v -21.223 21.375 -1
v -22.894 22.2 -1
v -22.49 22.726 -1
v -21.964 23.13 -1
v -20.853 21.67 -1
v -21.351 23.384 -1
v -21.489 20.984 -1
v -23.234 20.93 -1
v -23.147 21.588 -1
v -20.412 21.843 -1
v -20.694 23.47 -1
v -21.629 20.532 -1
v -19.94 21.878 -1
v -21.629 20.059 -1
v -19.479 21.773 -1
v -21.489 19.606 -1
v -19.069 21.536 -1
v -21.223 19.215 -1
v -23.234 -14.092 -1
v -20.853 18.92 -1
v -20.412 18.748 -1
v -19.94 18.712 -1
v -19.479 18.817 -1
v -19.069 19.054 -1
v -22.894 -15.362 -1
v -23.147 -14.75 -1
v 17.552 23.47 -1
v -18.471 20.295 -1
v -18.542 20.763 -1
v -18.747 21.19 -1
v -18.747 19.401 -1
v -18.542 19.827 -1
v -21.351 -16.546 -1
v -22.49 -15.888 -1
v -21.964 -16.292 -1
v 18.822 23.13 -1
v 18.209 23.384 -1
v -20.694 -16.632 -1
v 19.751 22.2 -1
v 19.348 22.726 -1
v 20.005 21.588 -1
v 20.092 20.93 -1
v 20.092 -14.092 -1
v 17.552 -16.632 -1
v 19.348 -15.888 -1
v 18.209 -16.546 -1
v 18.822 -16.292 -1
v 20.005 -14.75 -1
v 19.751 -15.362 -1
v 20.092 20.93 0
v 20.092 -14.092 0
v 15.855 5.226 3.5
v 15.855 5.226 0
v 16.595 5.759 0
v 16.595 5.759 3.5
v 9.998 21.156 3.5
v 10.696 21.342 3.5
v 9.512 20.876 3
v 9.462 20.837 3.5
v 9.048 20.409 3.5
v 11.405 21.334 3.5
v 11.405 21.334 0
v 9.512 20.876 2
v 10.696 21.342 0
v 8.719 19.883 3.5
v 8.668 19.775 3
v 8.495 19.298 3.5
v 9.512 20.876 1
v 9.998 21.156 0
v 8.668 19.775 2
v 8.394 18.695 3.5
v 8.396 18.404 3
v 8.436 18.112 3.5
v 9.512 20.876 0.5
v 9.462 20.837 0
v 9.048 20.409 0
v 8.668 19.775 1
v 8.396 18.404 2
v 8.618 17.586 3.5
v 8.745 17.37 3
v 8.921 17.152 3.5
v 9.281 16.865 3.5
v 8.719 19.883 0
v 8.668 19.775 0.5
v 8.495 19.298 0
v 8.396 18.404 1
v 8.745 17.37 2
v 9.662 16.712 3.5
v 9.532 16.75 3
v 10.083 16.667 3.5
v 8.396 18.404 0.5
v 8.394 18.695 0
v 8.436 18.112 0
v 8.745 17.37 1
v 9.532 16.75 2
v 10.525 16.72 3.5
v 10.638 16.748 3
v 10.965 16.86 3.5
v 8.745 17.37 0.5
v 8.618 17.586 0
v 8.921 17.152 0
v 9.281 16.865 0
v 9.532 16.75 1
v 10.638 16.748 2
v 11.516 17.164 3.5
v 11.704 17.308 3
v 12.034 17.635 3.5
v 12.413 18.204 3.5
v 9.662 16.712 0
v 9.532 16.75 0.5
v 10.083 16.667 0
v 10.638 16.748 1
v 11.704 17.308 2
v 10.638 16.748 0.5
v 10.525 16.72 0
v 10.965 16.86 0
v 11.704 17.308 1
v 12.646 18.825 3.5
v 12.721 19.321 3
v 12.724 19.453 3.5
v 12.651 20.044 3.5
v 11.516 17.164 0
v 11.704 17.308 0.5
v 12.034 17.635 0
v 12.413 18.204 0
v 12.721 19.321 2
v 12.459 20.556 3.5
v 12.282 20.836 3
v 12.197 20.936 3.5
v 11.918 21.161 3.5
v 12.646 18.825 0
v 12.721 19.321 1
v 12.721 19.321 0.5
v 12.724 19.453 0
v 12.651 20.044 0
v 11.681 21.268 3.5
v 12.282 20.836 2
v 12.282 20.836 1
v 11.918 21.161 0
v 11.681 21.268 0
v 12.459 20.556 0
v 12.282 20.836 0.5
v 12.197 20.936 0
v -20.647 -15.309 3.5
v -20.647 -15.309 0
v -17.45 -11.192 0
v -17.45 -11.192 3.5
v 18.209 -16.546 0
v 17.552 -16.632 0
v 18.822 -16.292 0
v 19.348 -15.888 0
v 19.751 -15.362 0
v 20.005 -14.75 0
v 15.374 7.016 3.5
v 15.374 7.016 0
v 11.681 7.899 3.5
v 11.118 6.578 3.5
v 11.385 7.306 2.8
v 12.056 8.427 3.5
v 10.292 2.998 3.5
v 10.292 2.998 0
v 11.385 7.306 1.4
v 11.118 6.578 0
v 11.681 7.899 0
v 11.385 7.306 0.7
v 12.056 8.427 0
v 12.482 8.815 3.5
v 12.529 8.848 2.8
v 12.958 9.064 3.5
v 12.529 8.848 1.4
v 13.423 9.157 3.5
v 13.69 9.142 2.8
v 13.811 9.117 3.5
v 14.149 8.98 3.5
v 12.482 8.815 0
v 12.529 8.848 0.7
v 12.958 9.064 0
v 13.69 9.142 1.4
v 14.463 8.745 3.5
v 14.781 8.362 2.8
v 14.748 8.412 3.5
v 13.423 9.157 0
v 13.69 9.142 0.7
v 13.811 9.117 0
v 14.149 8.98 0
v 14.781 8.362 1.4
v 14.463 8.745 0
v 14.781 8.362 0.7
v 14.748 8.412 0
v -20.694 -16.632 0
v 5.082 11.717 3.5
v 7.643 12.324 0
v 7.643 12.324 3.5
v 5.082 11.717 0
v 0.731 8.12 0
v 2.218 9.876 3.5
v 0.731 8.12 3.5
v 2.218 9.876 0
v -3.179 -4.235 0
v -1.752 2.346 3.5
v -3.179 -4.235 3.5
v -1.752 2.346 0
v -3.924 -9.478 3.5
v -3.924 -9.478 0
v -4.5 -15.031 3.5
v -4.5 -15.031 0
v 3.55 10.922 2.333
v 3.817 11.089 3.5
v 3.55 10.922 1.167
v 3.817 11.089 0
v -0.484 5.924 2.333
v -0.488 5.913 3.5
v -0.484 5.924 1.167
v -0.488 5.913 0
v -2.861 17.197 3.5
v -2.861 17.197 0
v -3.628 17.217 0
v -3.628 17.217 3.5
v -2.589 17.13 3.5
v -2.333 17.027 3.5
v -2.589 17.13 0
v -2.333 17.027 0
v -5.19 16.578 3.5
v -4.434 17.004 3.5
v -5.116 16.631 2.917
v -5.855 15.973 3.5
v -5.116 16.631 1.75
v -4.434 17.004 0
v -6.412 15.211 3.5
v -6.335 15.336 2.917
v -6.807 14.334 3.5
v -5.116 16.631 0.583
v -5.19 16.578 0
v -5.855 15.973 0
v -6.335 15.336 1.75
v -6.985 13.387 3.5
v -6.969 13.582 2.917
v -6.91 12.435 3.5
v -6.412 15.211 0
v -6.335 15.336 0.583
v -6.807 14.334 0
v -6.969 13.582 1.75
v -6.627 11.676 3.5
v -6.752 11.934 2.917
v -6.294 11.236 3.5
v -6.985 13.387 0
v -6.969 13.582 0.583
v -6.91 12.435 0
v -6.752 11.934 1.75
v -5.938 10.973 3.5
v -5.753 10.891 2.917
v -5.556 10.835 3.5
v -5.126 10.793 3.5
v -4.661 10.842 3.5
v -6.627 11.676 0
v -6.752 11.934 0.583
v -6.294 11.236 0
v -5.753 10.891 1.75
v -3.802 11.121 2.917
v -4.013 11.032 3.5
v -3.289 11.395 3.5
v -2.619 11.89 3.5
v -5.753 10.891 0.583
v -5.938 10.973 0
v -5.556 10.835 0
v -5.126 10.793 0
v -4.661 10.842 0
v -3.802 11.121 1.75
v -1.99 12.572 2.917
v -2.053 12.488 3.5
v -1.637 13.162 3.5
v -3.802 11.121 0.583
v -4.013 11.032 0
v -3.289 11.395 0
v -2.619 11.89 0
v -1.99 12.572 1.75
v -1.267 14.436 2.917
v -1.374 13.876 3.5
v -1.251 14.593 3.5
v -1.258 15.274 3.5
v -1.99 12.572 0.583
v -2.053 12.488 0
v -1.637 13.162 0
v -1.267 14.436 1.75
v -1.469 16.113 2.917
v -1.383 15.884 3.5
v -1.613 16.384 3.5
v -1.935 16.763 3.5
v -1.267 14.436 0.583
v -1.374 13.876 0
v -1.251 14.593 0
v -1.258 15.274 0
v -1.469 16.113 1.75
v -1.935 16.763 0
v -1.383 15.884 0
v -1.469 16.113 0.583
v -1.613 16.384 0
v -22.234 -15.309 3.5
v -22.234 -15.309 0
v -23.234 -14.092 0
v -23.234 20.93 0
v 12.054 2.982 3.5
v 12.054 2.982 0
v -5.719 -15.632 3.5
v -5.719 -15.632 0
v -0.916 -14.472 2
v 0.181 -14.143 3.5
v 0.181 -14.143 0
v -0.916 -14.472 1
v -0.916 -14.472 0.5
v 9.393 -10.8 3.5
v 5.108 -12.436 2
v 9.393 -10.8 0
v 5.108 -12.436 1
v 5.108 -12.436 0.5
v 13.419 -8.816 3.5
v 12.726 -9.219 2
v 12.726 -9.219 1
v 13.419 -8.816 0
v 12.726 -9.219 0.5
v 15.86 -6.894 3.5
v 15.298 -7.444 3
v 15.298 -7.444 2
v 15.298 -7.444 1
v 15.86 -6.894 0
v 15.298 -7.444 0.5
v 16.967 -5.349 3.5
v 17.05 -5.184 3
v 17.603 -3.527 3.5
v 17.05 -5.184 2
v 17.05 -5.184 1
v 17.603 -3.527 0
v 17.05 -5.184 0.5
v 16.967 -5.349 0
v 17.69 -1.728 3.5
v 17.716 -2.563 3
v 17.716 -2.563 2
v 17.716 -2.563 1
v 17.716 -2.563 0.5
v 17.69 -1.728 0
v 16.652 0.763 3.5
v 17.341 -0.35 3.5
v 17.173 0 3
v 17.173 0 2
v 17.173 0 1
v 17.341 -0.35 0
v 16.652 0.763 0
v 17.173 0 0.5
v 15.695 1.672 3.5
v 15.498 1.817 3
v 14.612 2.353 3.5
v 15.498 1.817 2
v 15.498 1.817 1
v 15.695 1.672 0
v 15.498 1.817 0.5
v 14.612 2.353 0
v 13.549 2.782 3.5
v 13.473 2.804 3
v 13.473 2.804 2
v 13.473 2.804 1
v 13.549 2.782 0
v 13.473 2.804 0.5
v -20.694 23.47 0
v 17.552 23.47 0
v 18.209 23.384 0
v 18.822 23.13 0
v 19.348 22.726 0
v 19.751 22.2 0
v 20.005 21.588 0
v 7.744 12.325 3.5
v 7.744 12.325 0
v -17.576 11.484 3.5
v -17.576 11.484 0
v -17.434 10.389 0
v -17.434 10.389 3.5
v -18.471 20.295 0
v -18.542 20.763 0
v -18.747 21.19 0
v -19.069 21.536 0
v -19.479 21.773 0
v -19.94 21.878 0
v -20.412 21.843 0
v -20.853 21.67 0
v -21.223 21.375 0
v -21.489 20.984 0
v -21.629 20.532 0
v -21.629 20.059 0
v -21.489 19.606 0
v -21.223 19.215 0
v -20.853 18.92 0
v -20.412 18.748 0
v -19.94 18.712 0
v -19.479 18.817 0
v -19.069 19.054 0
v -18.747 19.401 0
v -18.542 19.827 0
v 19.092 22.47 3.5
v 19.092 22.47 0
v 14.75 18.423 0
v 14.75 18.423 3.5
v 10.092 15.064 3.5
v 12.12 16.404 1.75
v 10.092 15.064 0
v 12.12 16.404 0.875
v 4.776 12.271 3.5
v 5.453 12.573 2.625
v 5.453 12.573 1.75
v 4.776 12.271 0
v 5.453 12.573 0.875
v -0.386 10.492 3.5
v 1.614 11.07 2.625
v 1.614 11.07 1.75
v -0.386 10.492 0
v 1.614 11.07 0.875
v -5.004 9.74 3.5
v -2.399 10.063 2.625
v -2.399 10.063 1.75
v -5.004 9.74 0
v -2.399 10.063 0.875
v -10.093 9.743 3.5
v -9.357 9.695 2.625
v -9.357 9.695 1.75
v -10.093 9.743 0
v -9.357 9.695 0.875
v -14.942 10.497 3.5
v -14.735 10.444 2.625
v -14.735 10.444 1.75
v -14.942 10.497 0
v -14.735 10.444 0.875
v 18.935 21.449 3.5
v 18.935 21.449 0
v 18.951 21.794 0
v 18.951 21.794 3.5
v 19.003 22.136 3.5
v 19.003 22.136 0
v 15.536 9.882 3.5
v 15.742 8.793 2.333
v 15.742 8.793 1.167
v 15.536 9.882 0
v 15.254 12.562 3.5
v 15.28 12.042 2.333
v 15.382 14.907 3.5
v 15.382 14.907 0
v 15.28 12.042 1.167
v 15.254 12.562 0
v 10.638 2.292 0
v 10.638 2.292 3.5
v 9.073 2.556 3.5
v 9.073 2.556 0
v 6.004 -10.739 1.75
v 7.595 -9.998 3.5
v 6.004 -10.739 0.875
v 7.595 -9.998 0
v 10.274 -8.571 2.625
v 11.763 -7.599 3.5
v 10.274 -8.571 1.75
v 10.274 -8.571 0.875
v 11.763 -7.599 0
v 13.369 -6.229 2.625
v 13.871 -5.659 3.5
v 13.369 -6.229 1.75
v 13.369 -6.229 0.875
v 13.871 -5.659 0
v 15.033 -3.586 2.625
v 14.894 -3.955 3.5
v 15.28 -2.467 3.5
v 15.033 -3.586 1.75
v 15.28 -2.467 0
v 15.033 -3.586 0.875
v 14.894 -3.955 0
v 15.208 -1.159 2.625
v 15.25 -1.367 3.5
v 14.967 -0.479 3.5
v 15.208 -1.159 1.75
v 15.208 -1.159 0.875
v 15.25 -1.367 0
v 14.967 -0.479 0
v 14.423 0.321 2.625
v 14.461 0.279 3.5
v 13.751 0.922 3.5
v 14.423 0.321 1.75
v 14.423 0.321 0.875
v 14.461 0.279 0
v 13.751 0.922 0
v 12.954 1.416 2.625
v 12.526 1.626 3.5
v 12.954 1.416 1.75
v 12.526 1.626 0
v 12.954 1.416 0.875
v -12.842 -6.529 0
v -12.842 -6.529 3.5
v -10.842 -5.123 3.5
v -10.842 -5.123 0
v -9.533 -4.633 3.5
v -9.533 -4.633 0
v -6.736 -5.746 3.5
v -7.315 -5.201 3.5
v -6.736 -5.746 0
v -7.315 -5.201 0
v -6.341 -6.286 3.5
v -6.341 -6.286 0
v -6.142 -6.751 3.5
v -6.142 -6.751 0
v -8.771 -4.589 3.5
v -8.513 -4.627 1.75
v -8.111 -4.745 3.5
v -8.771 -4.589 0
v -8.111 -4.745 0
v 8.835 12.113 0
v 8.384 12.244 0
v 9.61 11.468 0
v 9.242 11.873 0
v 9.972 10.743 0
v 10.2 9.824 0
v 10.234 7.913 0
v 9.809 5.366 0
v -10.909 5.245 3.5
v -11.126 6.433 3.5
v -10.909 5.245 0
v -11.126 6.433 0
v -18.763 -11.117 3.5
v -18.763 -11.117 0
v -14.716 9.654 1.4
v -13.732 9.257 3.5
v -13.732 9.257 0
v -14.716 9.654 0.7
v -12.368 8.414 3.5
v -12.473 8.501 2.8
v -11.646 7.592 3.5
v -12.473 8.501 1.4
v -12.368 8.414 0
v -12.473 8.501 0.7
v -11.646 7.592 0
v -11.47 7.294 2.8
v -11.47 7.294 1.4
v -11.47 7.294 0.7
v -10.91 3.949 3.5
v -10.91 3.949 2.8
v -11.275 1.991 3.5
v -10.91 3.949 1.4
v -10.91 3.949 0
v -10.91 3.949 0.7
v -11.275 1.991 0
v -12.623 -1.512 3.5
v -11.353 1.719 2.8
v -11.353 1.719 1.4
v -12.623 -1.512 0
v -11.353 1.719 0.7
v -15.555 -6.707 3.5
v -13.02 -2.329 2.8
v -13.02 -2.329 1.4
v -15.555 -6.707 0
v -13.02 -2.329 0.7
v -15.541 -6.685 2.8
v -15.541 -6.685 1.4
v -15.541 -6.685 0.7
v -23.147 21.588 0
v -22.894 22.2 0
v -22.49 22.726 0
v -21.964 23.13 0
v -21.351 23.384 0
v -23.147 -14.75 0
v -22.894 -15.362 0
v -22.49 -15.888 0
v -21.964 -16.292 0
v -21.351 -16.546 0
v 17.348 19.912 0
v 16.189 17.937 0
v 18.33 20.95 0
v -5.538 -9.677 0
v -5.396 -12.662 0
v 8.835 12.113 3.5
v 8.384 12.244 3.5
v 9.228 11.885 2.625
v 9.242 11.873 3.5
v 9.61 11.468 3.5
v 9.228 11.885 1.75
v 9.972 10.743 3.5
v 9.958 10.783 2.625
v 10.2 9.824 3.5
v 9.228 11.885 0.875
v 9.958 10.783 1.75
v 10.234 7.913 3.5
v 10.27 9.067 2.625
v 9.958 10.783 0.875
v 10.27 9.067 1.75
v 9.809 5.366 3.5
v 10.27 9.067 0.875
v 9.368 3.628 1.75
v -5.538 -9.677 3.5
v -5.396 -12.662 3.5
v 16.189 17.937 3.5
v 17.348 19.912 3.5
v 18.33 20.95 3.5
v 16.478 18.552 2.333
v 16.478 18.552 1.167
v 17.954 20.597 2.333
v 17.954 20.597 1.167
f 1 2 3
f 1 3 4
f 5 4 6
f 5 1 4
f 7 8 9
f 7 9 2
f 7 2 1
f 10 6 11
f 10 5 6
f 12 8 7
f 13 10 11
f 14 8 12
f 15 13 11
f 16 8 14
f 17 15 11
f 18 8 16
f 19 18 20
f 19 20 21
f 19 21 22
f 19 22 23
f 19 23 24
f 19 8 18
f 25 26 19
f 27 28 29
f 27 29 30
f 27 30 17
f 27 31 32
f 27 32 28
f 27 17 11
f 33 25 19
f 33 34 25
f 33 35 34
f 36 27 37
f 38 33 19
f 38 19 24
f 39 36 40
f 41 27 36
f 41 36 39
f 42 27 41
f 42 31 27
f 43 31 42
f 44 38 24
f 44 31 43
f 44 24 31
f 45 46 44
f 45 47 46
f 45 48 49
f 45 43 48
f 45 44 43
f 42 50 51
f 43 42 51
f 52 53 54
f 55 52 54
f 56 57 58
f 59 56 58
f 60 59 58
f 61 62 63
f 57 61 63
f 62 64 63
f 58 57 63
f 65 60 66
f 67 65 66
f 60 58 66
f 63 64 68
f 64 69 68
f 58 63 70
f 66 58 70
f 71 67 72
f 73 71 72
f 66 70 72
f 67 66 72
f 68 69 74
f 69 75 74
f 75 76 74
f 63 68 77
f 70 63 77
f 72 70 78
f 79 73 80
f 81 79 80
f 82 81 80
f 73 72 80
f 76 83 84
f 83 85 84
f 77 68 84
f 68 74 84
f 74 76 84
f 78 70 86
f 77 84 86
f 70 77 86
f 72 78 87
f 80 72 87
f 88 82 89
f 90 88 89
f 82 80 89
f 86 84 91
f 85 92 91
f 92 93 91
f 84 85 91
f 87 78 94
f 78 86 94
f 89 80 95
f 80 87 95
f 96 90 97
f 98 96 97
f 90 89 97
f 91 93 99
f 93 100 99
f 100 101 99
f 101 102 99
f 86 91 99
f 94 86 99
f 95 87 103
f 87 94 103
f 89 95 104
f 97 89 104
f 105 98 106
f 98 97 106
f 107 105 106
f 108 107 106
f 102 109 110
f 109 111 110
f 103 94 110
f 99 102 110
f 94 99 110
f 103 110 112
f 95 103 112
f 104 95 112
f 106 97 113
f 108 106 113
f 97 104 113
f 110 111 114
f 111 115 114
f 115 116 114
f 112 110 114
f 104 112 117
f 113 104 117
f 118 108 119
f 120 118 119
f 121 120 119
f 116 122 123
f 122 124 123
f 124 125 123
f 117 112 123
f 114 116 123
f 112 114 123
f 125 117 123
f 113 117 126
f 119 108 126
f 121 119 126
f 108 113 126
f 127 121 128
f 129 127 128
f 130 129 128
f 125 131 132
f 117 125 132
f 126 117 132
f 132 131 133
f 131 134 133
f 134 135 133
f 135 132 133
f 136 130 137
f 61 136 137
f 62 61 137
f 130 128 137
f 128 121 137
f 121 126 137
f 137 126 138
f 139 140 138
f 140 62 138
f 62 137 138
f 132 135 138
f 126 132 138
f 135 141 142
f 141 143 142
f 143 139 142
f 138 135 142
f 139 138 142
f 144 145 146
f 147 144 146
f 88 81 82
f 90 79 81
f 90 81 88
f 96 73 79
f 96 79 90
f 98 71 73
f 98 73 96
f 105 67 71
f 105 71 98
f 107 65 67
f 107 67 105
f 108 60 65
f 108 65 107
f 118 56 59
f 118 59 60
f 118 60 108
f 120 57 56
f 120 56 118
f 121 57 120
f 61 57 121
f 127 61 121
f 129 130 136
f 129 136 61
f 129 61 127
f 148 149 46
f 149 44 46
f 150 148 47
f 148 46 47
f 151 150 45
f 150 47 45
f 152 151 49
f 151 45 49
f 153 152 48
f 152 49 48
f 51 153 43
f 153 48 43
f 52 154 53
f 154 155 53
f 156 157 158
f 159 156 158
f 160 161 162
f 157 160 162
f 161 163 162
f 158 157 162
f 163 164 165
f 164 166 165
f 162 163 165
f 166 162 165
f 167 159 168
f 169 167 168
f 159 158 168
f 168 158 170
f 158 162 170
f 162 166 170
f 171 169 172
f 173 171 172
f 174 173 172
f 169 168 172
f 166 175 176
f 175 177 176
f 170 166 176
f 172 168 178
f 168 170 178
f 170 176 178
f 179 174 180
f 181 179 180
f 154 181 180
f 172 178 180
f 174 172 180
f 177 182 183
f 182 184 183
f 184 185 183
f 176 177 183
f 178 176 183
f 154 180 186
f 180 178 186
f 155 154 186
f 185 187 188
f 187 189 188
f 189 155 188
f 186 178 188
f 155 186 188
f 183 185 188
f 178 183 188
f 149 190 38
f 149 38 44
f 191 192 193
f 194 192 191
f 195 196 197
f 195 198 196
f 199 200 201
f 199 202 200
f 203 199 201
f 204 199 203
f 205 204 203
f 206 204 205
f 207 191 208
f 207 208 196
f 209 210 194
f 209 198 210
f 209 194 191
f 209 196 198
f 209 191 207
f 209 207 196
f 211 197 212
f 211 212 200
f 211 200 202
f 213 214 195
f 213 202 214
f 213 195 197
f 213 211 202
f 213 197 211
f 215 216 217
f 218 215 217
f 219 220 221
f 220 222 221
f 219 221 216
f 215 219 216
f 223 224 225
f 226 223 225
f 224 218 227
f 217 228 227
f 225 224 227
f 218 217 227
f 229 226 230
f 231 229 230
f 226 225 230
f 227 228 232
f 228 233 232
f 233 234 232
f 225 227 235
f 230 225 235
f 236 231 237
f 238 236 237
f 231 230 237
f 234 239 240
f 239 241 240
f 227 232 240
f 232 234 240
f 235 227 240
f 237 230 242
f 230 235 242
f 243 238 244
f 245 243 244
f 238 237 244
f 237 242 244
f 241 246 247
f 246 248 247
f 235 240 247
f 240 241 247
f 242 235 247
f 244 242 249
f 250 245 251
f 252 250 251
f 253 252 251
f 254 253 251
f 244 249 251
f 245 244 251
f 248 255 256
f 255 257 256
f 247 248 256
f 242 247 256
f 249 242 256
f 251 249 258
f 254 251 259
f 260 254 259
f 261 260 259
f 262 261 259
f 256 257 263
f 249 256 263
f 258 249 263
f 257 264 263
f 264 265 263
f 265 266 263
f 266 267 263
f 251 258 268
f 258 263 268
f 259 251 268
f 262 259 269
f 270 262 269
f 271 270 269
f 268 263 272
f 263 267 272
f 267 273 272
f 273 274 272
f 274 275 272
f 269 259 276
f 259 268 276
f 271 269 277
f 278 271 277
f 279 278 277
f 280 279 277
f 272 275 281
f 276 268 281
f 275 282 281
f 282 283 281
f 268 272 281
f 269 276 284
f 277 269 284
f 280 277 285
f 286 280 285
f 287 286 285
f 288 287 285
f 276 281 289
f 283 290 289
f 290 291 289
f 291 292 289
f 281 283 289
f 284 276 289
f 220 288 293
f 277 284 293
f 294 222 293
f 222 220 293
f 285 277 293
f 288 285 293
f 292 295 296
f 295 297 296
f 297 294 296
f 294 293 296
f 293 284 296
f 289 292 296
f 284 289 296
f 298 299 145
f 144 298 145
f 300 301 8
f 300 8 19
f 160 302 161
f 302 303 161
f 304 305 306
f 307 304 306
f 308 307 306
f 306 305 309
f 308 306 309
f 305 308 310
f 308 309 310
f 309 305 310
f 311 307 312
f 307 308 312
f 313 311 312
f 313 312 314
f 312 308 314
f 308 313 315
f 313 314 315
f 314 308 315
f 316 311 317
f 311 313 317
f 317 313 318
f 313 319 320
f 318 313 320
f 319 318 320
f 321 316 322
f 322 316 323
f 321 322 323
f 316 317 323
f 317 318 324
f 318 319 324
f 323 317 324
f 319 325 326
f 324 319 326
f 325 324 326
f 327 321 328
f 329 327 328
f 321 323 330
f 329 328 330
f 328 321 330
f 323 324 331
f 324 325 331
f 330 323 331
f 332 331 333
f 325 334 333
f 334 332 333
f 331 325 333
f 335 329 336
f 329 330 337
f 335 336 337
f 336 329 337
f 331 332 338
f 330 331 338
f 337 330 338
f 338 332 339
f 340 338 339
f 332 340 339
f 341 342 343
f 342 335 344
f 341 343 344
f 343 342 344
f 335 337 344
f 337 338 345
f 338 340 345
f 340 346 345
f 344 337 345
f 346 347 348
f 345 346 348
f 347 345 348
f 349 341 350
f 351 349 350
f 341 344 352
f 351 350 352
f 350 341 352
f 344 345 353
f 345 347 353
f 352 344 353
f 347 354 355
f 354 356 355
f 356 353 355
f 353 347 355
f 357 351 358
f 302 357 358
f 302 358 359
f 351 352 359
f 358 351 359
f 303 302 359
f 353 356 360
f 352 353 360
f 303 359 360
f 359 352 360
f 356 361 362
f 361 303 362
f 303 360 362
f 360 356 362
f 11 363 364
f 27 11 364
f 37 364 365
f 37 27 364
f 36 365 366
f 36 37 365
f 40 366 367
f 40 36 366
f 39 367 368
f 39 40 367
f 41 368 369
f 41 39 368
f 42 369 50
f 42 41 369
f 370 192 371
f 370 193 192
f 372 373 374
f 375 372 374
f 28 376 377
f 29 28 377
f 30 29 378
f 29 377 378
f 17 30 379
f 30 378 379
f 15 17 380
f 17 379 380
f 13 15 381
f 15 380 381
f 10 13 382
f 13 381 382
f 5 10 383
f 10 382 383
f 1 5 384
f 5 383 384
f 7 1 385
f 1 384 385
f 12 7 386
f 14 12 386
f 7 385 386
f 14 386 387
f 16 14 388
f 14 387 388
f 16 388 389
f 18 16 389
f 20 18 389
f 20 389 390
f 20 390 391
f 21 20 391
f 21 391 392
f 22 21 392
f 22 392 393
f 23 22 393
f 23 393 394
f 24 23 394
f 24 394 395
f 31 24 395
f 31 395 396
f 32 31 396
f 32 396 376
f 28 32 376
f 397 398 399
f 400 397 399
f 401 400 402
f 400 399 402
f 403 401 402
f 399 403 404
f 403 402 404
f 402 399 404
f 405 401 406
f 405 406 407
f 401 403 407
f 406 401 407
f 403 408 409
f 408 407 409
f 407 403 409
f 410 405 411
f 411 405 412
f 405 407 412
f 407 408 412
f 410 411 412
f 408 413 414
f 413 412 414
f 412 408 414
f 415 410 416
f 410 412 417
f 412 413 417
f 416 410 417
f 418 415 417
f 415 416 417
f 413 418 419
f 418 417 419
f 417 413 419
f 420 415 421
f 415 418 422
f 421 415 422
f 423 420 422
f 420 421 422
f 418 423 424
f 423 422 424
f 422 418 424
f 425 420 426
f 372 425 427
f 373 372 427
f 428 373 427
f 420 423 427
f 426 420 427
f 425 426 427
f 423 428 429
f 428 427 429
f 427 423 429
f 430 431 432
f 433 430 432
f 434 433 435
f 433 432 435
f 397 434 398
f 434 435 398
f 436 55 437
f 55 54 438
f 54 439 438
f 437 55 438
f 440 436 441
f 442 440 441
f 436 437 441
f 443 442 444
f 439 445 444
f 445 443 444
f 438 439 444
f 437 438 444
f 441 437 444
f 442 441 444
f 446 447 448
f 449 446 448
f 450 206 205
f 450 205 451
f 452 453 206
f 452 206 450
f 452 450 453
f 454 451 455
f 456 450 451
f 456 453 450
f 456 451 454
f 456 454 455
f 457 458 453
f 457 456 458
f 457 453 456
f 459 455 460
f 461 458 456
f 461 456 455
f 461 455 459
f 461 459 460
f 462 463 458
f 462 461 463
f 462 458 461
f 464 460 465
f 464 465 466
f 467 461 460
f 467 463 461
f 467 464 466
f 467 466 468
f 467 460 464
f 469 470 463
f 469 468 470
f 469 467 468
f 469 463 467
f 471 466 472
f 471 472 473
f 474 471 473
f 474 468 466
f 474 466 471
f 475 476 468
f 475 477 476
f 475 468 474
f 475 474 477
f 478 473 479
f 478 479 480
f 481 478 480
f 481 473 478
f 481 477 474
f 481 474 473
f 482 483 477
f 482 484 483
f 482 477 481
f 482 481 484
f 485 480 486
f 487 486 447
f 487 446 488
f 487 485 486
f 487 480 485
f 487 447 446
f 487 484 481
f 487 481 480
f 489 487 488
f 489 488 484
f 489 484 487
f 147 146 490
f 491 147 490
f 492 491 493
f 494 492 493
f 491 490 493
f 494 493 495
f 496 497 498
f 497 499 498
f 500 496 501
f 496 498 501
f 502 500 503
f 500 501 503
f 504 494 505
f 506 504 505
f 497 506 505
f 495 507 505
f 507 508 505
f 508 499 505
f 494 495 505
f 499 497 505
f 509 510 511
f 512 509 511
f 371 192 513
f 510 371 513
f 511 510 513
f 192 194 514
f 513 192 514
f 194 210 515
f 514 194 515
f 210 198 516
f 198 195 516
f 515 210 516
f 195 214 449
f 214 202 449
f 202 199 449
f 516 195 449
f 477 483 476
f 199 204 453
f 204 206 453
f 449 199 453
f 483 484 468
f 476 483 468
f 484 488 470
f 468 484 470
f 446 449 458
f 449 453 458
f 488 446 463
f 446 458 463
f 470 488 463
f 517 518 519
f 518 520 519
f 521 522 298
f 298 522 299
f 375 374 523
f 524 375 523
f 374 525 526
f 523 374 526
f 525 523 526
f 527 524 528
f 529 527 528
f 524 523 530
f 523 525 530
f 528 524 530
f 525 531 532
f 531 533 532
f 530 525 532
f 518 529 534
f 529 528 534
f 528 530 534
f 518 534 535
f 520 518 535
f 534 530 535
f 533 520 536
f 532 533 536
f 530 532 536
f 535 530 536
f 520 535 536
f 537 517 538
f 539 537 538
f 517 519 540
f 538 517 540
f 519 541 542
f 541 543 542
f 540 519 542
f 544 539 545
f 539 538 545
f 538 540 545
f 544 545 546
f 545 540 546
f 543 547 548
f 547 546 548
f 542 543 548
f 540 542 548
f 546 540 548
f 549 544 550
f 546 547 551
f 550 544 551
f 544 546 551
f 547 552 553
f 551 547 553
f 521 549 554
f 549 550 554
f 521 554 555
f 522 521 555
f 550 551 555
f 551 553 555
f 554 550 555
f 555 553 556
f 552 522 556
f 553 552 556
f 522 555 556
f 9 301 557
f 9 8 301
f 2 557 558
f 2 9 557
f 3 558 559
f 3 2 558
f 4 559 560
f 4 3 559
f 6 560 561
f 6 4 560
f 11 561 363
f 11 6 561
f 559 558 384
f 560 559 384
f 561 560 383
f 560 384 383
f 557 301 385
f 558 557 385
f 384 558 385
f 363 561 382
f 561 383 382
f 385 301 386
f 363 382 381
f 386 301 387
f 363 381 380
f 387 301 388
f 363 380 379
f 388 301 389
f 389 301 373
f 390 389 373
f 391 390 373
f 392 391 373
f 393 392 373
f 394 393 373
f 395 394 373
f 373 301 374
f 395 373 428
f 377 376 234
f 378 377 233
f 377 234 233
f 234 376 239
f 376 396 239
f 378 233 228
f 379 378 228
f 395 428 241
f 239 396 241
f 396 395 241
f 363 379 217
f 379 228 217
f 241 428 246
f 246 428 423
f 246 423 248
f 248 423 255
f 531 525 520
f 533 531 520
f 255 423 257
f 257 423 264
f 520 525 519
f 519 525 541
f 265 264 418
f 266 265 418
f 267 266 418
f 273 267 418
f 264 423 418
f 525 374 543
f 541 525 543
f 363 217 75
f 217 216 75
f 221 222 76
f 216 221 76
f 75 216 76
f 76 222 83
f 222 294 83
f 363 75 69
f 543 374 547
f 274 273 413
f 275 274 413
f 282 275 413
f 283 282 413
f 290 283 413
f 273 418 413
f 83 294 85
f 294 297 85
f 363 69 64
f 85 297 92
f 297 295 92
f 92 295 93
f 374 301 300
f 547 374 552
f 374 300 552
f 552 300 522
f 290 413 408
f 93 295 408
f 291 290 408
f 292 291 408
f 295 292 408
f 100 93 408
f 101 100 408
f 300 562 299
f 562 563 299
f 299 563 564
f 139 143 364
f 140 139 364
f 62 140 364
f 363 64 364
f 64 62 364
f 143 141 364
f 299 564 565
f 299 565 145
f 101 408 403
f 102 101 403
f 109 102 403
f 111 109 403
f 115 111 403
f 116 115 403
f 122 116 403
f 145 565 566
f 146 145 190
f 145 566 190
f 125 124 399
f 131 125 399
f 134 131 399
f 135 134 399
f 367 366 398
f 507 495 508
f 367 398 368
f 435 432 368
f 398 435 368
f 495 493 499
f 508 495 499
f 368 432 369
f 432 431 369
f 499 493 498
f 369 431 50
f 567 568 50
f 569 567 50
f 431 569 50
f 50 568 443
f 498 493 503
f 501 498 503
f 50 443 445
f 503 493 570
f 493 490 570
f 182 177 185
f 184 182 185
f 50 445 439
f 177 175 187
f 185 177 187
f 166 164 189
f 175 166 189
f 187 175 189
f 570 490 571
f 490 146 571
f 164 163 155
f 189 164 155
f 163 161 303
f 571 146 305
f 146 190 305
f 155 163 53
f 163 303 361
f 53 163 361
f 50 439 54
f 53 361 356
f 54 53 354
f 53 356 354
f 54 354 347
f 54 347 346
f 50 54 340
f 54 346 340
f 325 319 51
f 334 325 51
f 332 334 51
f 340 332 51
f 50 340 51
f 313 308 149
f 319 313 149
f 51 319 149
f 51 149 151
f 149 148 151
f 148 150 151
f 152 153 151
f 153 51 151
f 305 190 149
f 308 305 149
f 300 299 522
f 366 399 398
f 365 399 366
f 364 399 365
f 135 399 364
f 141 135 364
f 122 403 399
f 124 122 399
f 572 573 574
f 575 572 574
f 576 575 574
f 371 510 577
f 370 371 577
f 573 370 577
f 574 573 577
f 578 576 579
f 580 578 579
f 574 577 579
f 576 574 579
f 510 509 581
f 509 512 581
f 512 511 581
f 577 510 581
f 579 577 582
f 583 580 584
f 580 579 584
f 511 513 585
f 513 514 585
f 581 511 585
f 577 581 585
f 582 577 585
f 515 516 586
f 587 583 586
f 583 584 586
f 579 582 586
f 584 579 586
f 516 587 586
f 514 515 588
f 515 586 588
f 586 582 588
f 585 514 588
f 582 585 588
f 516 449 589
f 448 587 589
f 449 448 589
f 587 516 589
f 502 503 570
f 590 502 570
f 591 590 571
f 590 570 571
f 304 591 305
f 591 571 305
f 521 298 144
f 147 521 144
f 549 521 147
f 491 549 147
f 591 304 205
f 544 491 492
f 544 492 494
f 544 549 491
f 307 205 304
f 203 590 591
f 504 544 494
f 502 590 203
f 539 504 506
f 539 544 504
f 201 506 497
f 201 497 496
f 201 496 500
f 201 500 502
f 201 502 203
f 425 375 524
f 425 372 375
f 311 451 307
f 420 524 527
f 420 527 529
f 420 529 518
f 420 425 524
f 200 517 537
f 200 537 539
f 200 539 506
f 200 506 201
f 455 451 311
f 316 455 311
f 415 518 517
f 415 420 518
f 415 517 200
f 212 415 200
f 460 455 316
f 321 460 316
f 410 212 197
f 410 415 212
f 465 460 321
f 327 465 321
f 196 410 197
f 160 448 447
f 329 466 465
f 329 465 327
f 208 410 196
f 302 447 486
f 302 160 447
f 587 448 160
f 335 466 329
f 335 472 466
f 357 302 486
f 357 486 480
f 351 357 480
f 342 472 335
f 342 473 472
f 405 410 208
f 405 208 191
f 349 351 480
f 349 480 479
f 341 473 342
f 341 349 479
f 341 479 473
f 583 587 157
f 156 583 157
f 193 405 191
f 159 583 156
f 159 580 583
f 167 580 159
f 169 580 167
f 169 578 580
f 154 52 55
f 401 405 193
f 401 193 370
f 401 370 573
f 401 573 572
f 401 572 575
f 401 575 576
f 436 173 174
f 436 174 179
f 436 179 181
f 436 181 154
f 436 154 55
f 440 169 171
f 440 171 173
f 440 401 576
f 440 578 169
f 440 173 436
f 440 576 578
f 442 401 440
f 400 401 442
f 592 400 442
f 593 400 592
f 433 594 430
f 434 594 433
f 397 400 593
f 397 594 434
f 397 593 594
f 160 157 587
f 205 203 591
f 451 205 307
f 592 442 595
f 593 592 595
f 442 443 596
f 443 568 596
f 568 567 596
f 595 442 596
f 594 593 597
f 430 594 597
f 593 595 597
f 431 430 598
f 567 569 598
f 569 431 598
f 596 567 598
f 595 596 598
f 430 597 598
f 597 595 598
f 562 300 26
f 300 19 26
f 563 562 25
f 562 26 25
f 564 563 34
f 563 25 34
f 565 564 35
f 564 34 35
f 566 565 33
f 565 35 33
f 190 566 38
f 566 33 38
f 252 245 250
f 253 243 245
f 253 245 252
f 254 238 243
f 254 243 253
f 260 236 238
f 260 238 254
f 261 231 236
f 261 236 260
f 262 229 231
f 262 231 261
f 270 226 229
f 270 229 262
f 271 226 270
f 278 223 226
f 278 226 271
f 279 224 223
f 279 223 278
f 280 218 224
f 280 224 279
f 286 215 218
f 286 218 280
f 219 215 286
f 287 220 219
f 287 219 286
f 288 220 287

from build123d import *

# Parameters (mm, degrees)
F2_DEPTH = 3.5
F3_R     = 0.5
F4_W     = 43.3254797459
F4_H     = 40.102472201
F5_DEPTH = 1
F6_R     = 2.54
F7_R     = 1.5875
F8_DEPTH = 1.001


with BuildPart() as f2:
    # F1 (on Top) → F2 (new body)
    with BuildSketch(Plane.XY):
        with BuildLine():
            add(Edge.make_bspline(
                [(-17.4339525402, 10.3891612962), (-15.6323134553, 10.0079308799), (-12.1374402199, 9.0093816519), (-10.6919359478, 5.7963203672), (-11.0162612085, 1.3507189636), (-15.3995640473, -7.1917124281), (-19.8703347697, -12.5280161658), (-22.2338102758, -15.3087150569)],
                knots=[0, 0, 0, 0, 0.185027338, 0.324900272, 0.4885446752, 0.7346503855, 1, 1, 1, 1], degree=3))
            Line((-22.2338102758, -15.3087150569), (-20.6469583892, -15.3087150569))
            Line((-20.6469583892, -15.3087150569), (-17.4498129636, -11.1921811476))
            add(Edge.make_bspline(
                [(-17.4498129636, -11.1921811476), (-13.8443388928, -7.1938189637), (-9.1657634903, -2.5388799933), (-6.2824699242, -6.1266756704), (-6.141546648, -6.7511168309)],
                knots=[0, 0, 0, 0, 0.5476828629, 0.8411437, 0.8411437, 0.8411437, 0.8411437], degree=3))
            ThreePointArc((-6.141546648, -6.7511168309), (-5.409161203, -11.1668613275), (-5.7186982594, -15.6322140247))
            add(Edge.make_bspline(
                [(-5.7186982594, -15.6322140247), (-4.1345648834, -15.2826036519), (-0.7754448436, -14.5566042515), (5.1408747925, -12.434614726), (12.8260776584, -9.6106980275), (17.6624063976, -5.7454684251), (18.1534572055, 0.3909734442), (13.3402200524, 3.2898837323), (11.6895463163, 2.9265196946), (10.2915409952, 2.9976635706)],
                knots=[0, 0, 0, 0, 0.1366345631, 0.2916182247, 0.4683803158, 0.6178652577, 0.7578296815, 0.8902654147, 1, 1, 1, 1], degree=3))
            add(Edge.make_bspline(
                [(10.2915409952, 2.9976635706), (10.6037116769, 4.5995212016), (11.121042825, 7.2541293884), (12.3681444753, 8.9452024325), (13.7408077766, 9.3225541685), (15.0711420261, 8.4127840248), (15.5579400578, 6.4351685963), (15.8554706722, 5.2264514379)],
                knots=[0, 0, 0, 0, 0.2786092894, 0.4617130052, 0.6063354175, 0.7593924842, 1, 1, 1, 1], degree=3))
            Line((15.8554706722, 5.2264514379), (16.5946800262, 5.7591018267))
            add(Edge.make_bspline(
                [(16.5946800262, 5.7591018267), (15.6030077487, 8.4872478619), (14.9414511397, 12.4320834875), (15.3824891895, 14.9067947641)],
                knots=[0, 0, 0, 0, 9.2276591128, 9.2276591128, 9.2276591128, 9.2276591128], degree=3))
            add(Edge.make_bspline(
                [(15.3824891895, 14.9067947641), (15.9950405359, 19.488684833), (18.4942539781, 21.0568197072), (18.9352910966, 21.4488524944)],
                knots=[0, 0, 0, 0, 7.4445228683, 7.4445228683, 7.4445228683, 7.4445228683], degree=3))
            ThreePointArc((18.9352910966, 21.4488524944), (18.9723816979, 21.9658475756), (19.0916694701, 22.4702581763))
            add(Edge.make_bspline(
                [(19.0916694701, 22.4702581763), (17.1391241227, 20.5266388949), (12.3113934749, 15.7685533475), (-1.6381812303, 8.6145801304), (-14.484715583, 10.0543976299), (-16.8350384415, 11.1262385256), (-17.5760388374, 11.4835882559)],
                knots=[0, 0, 0, 0, 0.2476986843, 0.5720215474, 0.8582703215, 1, 1, 1, 1], degree=3))
            Line((-17.5760388374, 11.4835882559), (-17.4339525402, 10.3891612962))
        make_face()
        with BuildLine():
            add(Edge.make_bspline(
                [(7.6939919963, 12.3298484832), (6.0740151322, 12.1584455461), (3.2156512661, 11.1929585752), (-1.9015256855, 5.7143098104), (-3.7579613272, -6.6987425089), (-4.5002130792, -15.0309447199)],
                knots=[0, 0, 0, 0, 0.2262804636, 0.5003950599, 1, 1, 1, 1], degree=3))
            add(Edge.make_bspline(
                [(7.6939919963, 12.3298484832), (8.2357878891, 12.2796959469), (9.5447593938, 12.1698241039), (10.7343592641, 9.0033330286), (9.5166533517, 4.1128592846), (9.1828305335, 2.9642551286), (9.0727172792, 2.5556944311)],
                knots=[0, 0, 0, 0, 0.1945387115, 0.4614244984, 0.8083680191, 1, 1, 1, 1], degree=3))
            add(Edge.make_bspline(
                [(-4.5002130792, -15.0309447199), (2.8558875463, -12.0265206408), (14.0170136994, -8.2209898174), (15.9570611629, -1.0495553897), (13.2537960098, 1.6836264039), (9.9532447133, 2.5335151768), (9.0727172792, 2.5556944311)],
                knots=[0, 0, 0, 0, 0.4192181319, 0.637329332, 0.8110754178, 1, 1, 1, 1], degree=3))
        make_face(mode=Mode.SUBTRACT)
    extrude(amount=F2_DEPTH)

    # F3
    f3_edges = [f2.edges().sort_by_distance(p)[0] for p in [
        (-6.141547, -6.751117, 1.75),
        (-17.449813, -11.192181, 1.75),
        (15.382489, 14.906795, 1.75),
        (7.693992, 12.329848, 1.75),
    ]]
    fillet(f3_edges, radius=F3_R)



with BuildPart() as f2b:
    # F1 (on Top) → F2, piece 2 (new body)
    with BuildSketch(Plane.XY):
        with BuildLine():
            add(Edge.make_bspline(
                [(-2.8614087496, 17.1973500401), (-3.5556827087, 17.3241178573), (-5.389562243, 16.9260826716), (-7.5579403377, 13.7810404975), (-6.1730432105, 9.7854532262), (-1.2338013156, 12.1222002182), (-1.0195955001, 16.2585104895), (-2.2563645744, 17.0868747322), (-2.8614087496, 17.1973500401)],
                knots=[0, 0, 0, 0, 0.1468456921, 0.3287854481, 0.4942794947, 0.6898238724, 0.8720272747, 1, 1, 1, 1], degree=3))
        make_face()
    extrude(amount=F2_DEPTH)


with BuildPart() as f2c:
    # F1 (on Top) → F2, piece 3 (new body)
    with BuildSketch(Plane.XY):
        with BuildLine():
            add(Edge.make_bspline(
                [(11.4053785801, 21.3338844478), (10.8683124765, 21.4194626671), (9.2108684467, 21.2220414162), (7.9274955836, 18.4060915248), (9.3705188647, 16.265499475), (11.968032939, 17.0575573748), (12.9838664362, 19.2512490076), (12.4013006367, 20.9285062202), (11.7918199931, 21.2723073575), (11.4053785801, 21.3338844478)],
                knots=[0, 0, 0, 0, 0.1436178381, 0.3130615334, 0.4588254509, 0.6129292342, 0.7674481338, 0.8966609884, 1, 1, 1, 1], degree=3))
        make_face()
    extrude(amount=F2_DEPTH)


with BuildPart() as f2_1:
    add(f2.part)

    add(f2b.part)  # F5 merges F2b

    add(f2c.part)  # F5 merges F2c
    # F4 (on face) → F5 (join)
    with BuildSketch(Plane(origin=(0, 0, 0), x_dir=(1, 0, 0), z_dir=(0, 0, -1))):
        with Locations((-1.5710704029, -3.4190220758)):
            Rectangle(F4_W, F4_H)
    extrude(amount=F5_DEPTH)

    # F6
    f6_edges = [f2_1.edges().sort_by_distance(p)[0] for p in [
        (20.091669, -16.632214, -0.5),
        (20.091669, 23.470258, -0.5),
        (-23.23381, -16.632214, -0.5),
        (-23.23381, 23.470258, -0.5),
    ]]
    fillet(f6_edges, radius=F6_R)

    # F7 (on face) → F8 (cut, through all)
    with BuildSketch(Plane.XY):
        with Locations((-20.0588102758, 20.2952581763)):
            Circle(F7_R)
    extrude(amount=-F8_DEPTH, mode=Mode.SUBTRACT)


solid = f2_1.part
